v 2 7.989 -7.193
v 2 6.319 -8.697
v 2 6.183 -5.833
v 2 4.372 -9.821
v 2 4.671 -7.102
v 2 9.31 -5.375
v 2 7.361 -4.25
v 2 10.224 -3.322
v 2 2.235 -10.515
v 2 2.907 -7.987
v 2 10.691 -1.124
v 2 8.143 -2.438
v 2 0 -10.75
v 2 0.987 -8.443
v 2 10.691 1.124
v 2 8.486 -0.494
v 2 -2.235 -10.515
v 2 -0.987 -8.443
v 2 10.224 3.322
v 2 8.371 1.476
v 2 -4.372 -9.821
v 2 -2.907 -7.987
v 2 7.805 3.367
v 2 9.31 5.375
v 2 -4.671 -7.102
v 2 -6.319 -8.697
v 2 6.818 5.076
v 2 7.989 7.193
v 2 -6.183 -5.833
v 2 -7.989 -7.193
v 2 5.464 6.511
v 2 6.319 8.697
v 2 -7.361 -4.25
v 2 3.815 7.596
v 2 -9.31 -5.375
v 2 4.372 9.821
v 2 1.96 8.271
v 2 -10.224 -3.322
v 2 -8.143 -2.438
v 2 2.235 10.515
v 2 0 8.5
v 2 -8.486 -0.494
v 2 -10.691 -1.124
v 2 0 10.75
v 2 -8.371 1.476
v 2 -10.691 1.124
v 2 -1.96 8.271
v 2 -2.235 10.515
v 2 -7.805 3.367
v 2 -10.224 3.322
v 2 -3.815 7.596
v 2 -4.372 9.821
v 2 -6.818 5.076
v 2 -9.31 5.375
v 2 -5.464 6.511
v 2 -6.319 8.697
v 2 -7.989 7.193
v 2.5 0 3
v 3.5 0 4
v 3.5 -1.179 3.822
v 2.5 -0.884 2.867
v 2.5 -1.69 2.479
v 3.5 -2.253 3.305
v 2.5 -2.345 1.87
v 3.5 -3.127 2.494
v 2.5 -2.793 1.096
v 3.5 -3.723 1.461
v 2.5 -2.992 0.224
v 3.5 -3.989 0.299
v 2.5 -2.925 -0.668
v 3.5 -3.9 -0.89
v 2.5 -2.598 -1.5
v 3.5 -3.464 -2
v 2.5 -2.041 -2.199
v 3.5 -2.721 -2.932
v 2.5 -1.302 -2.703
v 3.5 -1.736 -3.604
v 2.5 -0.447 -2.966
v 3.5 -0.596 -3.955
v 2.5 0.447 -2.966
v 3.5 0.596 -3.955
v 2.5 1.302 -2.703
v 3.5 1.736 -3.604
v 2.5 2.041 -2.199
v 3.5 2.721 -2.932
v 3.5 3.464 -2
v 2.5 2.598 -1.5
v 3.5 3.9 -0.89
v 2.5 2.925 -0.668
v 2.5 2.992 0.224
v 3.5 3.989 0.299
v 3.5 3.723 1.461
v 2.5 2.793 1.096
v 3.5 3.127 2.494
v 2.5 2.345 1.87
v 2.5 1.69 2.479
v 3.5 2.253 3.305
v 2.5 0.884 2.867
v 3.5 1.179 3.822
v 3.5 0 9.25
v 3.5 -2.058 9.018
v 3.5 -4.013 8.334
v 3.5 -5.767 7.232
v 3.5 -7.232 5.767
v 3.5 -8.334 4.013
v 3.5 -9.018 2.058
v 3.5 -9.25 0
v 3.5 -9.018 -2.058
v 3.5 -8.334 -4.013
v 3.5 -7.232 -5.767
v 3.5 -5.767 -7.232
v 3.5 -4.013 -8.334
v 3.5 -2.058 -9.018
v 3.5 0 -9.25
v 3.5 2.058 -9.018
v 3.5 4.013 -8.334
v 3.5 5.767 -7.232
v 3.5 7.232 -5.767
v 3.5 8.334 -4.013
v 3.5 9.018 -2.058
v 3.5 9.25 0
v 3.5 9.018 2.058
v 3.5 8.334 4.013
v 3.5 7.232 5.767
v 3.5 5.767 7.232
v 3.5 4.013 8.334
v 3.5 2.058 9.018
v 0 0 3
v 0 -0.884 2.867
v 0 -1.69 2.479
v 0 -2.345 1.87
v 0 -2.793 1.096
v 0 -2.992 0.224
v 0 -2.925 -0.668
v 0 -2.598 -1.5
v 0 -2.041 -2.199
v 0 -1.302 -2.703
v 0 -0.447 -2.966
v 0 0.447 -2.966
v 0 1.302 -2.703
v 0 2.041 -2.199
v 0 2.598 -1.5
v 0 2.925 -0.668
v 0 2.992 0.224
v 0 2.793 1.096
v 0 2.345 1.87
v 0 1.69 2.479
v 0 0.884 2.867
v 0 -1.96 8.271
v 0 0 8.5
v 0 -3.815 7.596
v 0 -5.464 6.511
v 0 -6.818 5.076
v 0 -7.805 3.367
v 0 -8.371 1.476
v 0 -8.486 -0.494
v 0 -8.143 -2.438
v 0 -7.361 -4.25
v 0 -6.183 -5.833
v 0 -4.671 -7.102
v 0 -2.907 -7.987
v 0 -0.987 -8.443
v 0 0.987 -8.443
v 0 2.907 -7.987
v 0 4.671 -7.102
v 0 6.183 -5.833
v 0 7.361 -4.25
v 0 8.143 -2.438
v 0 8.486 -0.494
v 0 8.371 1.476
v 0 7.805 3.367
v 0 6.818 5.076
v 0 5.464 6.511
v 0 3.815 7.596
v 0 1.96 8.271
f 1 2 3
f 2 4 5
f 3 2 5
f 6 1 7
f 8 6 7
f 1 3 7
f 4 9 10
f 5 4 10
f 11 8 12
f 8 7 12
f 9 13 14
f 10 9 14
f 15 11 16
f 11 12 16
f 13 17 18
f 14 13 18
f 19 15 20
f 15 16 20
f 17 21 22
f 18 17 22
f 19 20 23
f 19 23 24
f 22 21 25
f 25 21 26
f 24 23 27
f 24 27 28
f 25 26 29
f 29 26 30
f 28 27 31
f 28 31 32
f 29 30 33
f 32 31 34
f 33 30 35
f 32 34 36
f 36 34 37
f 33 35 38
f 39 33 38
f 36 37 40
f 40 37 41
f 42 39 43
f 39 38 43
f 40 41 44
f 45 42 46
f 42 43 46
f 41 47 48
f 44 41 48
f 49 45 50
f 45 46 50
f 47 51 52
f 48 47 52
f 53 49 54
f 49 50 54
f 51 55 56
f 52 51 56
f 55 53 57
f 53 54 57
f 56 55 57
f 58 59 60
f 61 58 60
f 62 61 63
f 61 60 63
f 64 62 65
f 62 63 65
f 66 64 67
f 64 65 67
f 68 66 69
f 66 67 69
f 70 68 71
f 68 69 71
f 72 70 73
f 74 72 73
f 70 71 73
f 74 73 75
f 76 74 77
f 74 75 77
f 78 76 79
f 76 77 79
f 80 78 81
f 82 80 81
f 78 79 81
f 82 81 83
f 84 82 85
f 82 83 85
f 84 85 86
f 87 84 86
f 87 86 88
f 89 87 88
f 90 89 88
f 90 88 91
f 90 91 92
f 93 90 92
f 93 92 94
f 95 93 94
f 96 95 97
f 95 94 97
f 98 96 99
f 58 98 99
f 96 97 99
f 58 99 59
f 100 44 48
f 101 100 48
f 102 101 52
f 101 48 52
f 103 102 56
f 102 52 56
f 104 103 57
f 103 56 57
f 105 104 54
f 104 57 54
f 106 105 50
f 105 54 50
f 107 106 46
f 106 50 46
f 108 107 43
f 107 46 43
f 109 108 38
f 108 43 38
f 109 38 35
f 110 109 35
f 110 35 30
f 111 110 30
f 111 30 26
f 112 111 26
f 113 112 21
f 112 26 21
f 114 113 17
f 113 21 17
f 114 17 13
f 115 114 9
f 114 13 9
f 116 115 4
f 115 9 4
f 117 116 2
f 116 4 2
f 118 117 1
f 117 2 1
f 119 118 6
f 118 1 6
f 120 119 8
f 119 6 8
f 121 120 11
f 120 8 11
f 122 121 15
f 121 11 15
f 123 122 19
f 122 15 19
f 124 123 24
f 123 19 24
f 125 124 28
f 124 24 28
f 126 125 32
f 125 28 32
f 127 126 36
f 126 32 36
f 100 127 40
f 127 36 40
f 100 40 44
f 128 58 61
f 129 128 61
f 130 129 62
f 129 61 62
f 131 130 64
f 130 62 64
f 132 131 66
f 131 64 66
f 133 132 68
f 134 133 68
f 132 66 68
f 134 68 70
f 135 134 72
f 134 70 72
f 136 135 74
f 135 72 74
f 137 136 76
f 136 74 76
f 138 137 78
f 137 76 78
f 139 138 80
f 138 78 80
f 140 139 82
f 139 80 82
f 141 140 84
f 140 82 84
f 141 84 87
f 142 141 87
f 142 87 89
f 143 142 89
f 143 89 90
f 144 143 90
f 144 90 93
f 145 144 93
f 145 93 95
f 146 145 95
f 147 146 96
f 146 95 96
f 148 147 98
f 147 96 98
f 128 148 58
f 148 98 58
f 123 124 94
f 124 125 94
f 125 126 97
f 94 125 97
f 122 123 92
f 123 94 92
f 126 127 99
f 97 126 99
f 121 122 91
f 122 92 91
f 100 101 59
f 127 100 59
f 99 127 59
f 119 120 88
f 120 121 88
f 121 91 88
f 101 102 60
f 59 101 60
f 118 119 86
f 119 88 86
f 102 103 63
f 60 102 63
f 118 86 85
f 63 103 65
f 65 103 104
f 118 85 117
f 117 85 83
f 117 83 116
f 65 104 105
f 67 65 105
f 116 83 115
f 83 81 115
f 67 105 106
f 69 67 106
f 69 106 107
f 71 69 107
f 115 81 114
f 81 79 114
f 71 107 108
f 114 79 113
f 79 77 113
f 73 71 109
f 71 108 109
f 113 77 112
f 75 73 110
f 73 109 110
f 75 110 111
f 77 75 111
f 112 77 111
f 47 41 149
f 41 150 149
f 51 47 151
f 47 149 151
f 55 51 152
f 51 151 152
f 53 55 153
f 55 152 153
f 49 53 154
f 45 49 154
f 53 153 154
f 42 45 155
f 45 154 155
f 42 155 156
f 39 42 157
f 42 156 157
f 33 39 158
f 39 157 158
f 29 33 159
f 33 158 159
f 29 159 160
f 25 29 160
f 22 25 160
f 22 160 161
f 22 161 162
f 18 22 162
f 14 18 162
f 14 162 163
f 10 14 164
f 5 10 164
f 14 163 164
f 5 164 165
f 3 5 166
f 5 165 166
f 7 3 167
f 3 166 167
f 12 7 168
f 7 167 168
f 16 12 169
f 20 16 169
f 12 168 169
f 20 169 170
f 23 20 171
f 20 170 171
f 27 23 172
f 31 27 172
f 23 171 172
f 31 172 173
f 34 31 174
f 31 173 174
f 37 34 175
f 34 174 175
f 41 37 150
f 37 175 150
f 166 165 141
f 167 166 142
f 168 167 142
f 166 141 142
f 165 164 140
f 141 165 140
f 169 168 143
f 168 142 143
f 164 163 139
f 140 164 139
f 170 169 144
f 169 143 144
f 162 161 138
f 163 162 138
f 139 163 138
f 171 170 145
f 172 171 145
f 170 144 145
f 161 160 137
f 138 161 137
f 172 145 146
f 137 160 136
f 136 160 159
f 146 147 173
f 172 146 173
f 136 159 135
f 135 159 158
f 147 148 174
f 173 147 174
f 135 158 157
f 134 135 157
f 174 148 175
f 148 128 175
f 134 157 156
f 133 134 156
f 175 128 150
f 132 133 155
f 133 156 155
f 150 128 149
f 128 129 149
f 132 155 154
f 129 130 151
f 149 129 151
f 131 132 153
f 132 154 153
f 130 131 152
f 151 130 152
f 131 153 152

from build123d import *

# Parameters (mm, degrees)
F2_SIZE = 1
F3_SIZE = 1.49999


# Not quite as in the source:
# - a fillet or chamfer is up to 0.001 mm smaller than in the source, because OpenCascade refuses the exact size


with BuildPart() as f1:
    # F0 (on Front) → F1 (revolve)
    with BuildSketch(Plane.XZ):
        Polygon((0, 8.5), (0, 3), (3.5, 3), (3.5, 10.75), (2, 10.75), (2, 8.5), align=None)
    revolve(axis=Axis((1.1402515594, 0, 0), (1, 0, 0)))

    # F2
    f2_edges = [f1.edges().sort_by_distance(p)[0] for p in [
        (3.5, 0, -3),
    ]]
    chamfer(f2_edges, length=F2_SIZE)

    # F3 (size 1.5 in the source; OpenCascade refuses exactly that, so slightly less here)
    f3_edges = [f1.edges().sort_by_distance(p)[0] for p in [
        (3.5, 0, -10.75),
    ]]
    chamfer(f3_edges, length=F3_SIZE)


solid = f1.part
